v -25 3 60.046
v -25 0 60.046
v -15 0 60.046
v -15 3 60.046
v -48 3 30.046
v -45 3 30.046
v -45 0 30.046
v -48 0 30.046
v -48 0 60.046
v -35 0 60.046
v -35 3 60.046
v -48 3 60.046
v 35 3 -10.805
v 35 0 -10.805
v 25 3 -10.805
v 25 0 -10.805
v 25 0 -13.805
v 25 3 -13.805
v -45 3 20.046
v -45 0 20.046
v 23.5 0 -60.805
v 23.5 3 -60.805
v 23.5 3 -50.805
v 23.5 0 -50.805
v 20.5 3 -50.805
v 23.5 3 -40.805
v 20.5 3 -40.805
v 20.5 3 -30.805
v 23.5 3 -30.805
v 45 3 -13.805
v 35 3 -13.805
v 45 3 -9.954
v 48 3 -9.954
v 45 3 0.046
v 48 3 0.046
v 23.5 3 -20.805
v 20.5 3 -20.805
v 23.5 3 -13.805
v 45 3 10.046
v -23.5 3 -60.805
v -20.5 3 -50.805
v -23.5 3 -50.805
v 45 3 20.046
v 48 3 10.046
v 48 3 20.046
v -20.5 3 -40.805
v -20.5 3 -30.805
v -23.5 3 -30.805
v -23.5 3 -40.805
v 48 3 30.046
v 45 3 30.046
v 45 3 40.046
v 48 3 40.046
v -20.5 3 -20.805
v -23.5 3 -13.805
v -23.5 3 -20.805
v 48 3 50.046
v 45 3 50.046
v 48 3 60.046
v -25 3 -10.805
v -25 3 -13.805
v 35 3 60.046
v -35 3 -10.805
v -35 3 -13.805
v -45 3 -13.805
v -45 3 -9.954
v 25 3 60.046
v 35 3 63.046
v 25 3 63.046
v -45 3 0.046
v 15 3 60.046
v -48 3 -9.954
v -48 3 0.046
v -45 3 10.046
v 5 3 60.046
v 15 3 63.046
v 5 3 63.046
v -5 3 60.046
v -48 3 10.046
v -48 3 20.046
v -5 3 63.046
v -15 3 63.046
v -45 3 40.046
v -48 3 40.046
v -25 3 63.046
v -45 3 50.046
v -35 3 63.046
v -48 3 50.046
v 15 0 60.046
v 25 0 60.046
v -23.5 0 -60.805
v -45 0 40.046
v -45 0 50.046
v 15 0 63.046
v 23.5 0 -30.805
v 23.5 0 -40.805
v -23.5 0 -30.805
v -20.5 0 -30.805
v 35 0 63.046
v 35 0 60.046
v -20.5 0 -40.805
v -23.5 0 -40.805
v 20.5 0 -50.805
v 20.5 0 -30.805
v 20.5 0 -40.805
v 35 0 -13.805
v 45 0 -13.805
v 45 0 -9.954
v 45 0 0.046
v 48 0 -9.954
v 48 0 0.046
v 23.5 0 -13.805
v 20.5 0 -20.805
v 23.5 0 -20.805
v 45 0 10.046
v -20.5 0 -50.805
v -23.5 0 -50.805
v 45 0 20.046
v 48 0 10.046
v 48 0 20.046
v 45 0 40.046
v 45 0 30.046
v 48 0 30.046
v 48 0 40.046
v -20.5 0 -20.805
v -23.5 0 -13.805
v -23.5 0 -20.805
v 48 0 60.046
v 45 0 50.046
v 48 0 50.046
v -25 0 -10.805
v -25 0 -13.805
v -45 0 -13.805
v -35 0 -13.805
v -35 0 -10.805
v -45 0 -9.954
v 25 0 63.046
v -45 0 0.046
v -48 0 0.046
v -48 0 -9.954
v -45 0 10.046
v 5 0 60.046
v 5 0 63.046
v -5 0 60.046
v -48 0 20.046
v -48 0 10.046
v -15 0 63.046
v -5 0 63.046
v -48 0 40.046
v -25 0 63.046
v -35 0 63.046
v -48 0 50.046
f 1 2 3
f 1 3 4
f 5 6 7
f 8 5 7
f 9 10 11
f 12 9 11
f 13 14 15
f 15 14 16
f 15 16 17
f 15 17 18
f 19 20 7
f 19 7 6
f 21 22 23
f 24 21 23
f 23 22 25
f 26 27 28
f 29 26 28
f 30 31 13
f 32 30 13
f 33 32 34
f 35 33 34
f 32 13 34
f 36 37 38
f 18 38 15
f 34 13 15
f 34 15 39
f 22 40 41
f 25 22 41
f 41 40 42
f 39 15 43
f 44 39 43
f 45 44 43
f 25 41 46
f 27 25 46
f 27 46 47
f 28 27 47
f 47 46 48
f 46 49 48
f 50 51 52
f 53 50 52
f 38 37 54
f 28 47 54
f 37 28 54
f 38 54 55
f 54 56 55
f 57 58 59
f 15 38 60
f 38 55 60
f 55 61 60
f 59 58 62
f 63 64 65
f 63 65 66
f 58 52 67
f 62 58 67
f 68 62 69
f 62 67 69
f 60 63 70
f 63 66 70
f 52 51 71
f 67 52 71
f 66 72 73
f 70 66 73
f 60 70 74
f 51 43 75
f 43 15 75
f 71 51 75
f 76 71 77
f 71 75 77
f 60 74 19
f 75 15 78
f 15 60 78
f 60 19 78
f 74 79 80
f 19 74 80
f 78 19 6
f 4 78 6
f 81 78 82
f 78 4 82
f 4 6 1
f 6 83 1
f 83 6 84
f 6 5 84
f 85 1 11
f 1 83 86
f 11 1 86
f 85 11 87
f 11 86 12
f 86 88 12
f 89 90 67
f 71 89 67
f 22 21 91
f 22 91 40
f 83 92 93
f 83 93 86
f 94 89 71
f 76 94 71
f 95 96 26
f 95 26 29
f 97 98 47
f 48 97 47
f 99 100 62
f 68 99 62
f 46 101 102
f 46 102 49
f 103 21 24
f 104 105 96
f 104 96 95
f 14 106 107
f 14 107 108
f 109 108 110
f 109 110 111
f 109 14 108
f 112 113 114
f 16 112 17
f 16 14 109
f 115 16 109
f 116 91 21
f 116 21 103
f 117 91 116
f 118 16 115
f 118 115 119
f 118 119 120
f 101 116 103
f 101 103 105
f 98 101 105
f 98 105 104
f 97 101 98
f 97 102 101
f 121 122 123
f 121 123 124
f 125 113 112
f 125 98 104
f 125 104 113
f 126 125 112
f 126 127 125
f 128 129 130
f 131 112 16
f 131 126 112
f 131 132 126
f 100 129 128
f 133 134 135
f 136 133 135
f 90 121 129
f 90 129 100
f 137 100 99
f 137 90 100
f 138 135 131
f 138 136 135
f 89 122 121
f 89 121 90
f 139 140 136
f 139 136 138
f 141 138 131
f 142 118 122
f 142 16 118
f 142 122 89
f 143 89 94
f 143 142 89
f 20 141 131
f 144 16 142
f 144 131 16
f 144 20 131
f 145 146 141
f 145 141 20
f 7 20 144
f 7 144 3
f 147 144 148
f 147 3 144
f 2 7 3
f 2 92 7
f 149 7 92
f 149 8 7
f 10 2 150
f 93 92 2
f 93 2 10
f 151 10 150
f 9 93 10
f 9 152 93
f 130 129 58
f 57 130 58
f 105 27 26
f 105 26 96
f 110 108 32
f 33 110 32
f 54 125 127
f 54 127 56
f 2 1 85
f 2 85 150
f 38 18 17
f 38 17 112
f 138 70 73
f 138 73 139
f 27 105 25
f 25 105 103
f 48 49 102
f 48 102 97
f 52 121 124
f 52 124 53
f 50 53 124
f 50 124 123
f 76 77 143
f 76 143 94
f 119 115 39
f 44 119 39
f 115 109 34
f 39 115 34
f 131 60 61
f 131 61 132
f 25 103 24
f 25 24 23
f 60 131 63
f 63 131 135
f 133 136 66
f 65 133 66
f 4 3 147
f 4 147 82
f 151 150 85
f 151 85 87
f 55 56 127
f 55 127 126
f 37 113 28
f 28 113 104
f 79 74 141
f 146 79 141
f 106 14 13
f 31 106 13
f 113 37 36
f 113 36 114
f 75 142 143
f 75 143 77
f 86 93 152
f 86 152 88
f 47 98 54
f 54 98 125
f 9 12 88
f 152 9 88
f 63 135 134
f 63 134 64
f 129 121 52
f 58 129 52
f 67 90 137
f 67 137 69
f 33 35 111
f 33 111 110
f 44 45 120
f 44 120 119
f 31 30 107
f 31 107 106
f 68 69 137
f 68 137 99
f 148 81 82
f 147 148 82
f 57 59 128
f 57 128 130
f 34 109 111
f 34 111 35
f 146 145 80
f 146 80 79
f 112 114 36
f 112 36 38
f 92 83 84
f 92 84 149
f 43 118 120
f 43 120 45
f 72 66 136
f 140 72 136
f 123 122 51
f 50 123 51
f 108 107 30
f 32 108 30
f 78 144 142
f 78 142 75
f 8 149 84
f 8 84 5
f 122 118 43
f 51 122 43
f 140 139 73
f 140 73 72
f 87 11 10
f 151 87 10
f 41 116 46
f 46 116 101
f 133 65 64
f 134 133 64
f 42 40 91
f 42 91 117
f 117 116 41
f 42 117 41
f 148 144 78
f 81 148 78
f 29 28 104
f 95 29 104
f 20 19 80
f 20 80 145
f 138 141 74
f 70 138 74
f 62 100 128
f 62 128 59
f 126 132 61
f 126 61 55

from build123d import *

# Parameters (mm, degrees)
BOSS_EXTRUDE1_DEPTH     = 3
SKETCH3_W               = 10
SKETCH3_H               = 3
BOSS_EXTRUDE2_DEPTH     = 3
LPATTERN1_COUNT         = 3
LPATTERN1_PITCH         = 20
SKETCH4_W               = 10
SKETCH4_H               = 3
BOSS_EXTRUDE3_DEPTH     = 3
LPATTERN2_COUNT         = 2
LPATTERN2_PITCH         = 20
SKETCH5_W               = 10
SKETCH5_H               = 3
BOSS_EXTRUDE4_DEPTH     = 3
LPATTERN3_COUNT         = 4
LPATTERN3_PITCH         = 20
SKETCH6_W               = 10
SKETCH6_H               = 3
BOSS_EXTRUDE5_DEPTH     = 3
LPATTERN4_COUNT         = 2
LPATTERN4_PITCH         = 20
MIRROR3_COPY_1_SKETCH_W = 10
MIRROR3_COPY_1_SKETCH_H = 3
MIRROR3_COPY_1_DEPTH    = 3
MIRROR3_COPY_2_SKETCH_W = 10
MIRROR3_COPY_2_SKETCH_H = 3
MIRROR3_COPY_2_DEPTH    = 3
MIRROR3_COPY_3_SKETCH_W = 10
MIRROR3_COPY_3_SKETCH_H = 3
MIRROR3_COPY_3_DEPTH    = 3
MIRROR3_COPY_4_SKETCH_W = 10
MIRROR3_COPY_4_SKETCH_H = 3
MIRROR3_COPY_4_DEPTH    = 3
MIRROR3_COPY_5_SKETCH_W = 10
MIRROR3_COPY_5_SKETCH_H = 3
MIRROR3_COPY_5_DEPTH    = 3
MIRROR3_COPY_6_SKETCH_W = 10
MIRROR3_COPY_6_SKETCH_H = 3
MIRROR3_COPY_6_DEPTH    = 3
MIRROR3_COPY_7_SKETCH_W = 10
MIRROR3_COPY_7_SKETCH_H = 3
MIRROR3_COPY_7_DEPTH    = 3


with BuildPart() as part:
    # Sketch1 → Boss-Extrude1 (new body)
    with BuildSketch(Plane(origin=(0, 0, 0), x_dir=(1, 0, 0), z_dir=(0, 1, 0))):
        Polygon((20.5, 60.804597701), (-20.5, 60.804597701), (-20.5, 10.804597701), (-45, 10.804597701), (-45, -60.045977011), (45, -60.045977011), (45, 10.804597701), (20.5, 10.804597701), align=None)
    extrude(amount=BOSS_EXTRUDE1_DEPTH)

    # Sketch3 → Boss-Extrude2 (add)
    with BuildSketch(Plane.ZY.offset(20.5)):
        with Locations((-55.804597701, 1.5)):
            Rectangle(SKETCH3_W, SKETCH3_H)
    boss_extrude2 = extrude(amount=BOSS_EXTRUDE2_DEPTH)

    # LPattern1: Boss-Extrude2 ×3
    with Locations(*[(0, 0, i * LPATTERN1_PITCH) for i in range(1, LPATTERN1_COUNT)]):
        add(boss_extrude2)

    # Sketch4 → Boss-Extrude3 (add)
    with BuildSketch(Plane(origin=(0, 0, -10.804597701), x_dir=(-1, 0, 0), z_dir=(0, 0, -1))):
        with Locations((-40, 1.5)):
            Rectangle(SKETCH4_W, SKETCH4_H)
    boss_extrude3 = extrude(amount=BOSS_EXTRUDE3_DEPTH)

    # LPattern2: Boss-Extrude3 ×2
    with Locations(*[(-i * LPATTERN2_PITCH, 0, 0) for i in range(1, LPATTERN2_COUNT)]):
        add(boss_extrude3)

    # Sketch5 → Boss-Extrude4 (add)
    with BuildSketch(Plane(origin=(45, 0, 0), x_dir=(0, 0, -1), z_dir=(1, 0, 0))):
        with Locations((-55.045977011, 1.5)):
            Rectangle(SKETCH5_W, SKETCH5_H)
    boss_extrude4 = extrude(amount=BOSS_EXTRUDE4_DEPTH)

    # LPattern3: Boss-Extrude4 ×4
    with Locations(*[(0, 0, -i * LPATTERN3_PITCH) for i in range(1, LPATTERN3_COUNT)]):
        add(boss_extrude4)

    # Sketch6 → Boss-Extrude5 (add)
    with BuildSketch(Plane.XY.offset(60.045977011)):
        with Locations((10, 1.5)):
            Rectangle(SKETCH6_W, SKETCH6_H)
    boss_extrude5 = extrude(amount=BOSS_EXTRUDE5_DEPTH)

    # LPattern4: Boss-Extrude5 ×2
    with Locations(*[(i * LPATTERN4_PITCH, 0, 0) for i in range(1, LPATTERN4_COUNT)]):
        add(boss_extrude5)

    # Mirror3: Boss-Extrude2, Boss-Extrude3, Boss-Extrude4, Boss-Extrude5 across plane
    add(boss_extrude2.mirror(Plane.ZY))
    add(boss_extrude3.mirror(Plane.ZY))
    add(boss_extrude4.mirror(Plane.ZY))
    add(boss_extrude5.mirror(Plane.ZY))

    # Mirror3 copy 1 sketch → Mirror3 copy 1 (add)
    with BuildSketch(Plane(origin=(20, 0, -10.804597701), x_dir=(1, 0, 0), z_dir=(0, 0, -1))):
        with Locations((-40, -1.5)):
            Rectangle(MIRROR3_COPY_1_SKETCH_W, MIRROR3_COPY_1_SKETCH_H)
    extrude(amount=MIRROR3_COPY_1_DEPTH)

    # Mirror3 copy 2 sketch → Mirror3 copy 2 (add)
    with BuildSketch(Plane(origin=(-20, 0, 60.045977011), x_dir=(-1, 0, 0), z_dir=(0, 0, 1))):
        with Locations((10, -1.5)):
            Rectangle(MIRROR3_COPY_2_SKETCH_W, MIRROR3_COPY_2_SKETCH_H)
    extrude(amount=MIRROR3_COPY_2_DEPTH)

    # Mirror3 copy 3 sketch → Mirror3 copy 3 (add)
    with BuildSketch(Plane(origin=(-45, 0, -20), x_dir=(0, 0, -1), z_dir=(-1, 0, 0))):
        with Locations((-55.045977011, -1.5)):
            Rectangle(MIRROR3_COPY_3_SKETCH_W, MIRROR3_COPY_3_SKETCH_H)
    extrude(amount=MIRROR3_COPY_3_DEPTH)

    # Mirror3 copy 4 sketch → Mirror3 copy 4 (add)
    with BuildSketch(Plane(origin=(-45, 0, -40), x_dir=(0, 0, -1), z_dir=(-1, 0, 0))):
        with Locations((-55.045977011, -1.5)):
            Rectangle(MIRROR3_COPY_4_SKETCH_W, MIRROR3_COPY_4_SKETCH_H)
    extrude(amount=MIRROR3_COPY_4_DEPTH)

    # Mirror3 copy 5 sketch → Mirror3 copy 5 (add)
    with BuildSketch(Plane(origin=(-45, 0, -60), x_dir=(0, 0, -1), z_dir=(-1, 0, 0))):
        with Locations((-55.045977011, -1.5)):
            Rectangle(MIRROR3_COPY_5_SKETCH_W, MIRROR3_COPY_5_SKETCH_H)
    extrude(amount=MIRROR3_COPY_5_DEPTH)

    # Mirror3 copy 6 sketch → Mirror3 copy 6 (add)
    with BuildSketch(Plane(origin=(20.5, 0, 20), x_dir=(0, 0, 1), z_dir=(1, 0, 0))):
        with Locations((-55.804597701, -1.5)):
            Rectangle(MIRROR3_COPY_6_SKETCH_W, MIRROR3_COPY_6_SKETCH_H)
    extrude(amount=MIRROR3_COPY_6_DEPTH)

    # Mirror3 copy 7 sketch → Mirror3 copy 7 (add)
    with BuildSketch(Plane(origin=(20.5, 0, 40), x_dir=(0, 0, 1), z_dir=(1, 0, 0))):
        with Locations((-55.804597701, -1.5)):
            Rectangle(MIRROR3_COPY_7_SKETCH_W, MIRROR3_COPY_7_SKETCH_H)
    extrude(amount=MIRROR3_COPY_7_DEPTH)


solid = part.part
